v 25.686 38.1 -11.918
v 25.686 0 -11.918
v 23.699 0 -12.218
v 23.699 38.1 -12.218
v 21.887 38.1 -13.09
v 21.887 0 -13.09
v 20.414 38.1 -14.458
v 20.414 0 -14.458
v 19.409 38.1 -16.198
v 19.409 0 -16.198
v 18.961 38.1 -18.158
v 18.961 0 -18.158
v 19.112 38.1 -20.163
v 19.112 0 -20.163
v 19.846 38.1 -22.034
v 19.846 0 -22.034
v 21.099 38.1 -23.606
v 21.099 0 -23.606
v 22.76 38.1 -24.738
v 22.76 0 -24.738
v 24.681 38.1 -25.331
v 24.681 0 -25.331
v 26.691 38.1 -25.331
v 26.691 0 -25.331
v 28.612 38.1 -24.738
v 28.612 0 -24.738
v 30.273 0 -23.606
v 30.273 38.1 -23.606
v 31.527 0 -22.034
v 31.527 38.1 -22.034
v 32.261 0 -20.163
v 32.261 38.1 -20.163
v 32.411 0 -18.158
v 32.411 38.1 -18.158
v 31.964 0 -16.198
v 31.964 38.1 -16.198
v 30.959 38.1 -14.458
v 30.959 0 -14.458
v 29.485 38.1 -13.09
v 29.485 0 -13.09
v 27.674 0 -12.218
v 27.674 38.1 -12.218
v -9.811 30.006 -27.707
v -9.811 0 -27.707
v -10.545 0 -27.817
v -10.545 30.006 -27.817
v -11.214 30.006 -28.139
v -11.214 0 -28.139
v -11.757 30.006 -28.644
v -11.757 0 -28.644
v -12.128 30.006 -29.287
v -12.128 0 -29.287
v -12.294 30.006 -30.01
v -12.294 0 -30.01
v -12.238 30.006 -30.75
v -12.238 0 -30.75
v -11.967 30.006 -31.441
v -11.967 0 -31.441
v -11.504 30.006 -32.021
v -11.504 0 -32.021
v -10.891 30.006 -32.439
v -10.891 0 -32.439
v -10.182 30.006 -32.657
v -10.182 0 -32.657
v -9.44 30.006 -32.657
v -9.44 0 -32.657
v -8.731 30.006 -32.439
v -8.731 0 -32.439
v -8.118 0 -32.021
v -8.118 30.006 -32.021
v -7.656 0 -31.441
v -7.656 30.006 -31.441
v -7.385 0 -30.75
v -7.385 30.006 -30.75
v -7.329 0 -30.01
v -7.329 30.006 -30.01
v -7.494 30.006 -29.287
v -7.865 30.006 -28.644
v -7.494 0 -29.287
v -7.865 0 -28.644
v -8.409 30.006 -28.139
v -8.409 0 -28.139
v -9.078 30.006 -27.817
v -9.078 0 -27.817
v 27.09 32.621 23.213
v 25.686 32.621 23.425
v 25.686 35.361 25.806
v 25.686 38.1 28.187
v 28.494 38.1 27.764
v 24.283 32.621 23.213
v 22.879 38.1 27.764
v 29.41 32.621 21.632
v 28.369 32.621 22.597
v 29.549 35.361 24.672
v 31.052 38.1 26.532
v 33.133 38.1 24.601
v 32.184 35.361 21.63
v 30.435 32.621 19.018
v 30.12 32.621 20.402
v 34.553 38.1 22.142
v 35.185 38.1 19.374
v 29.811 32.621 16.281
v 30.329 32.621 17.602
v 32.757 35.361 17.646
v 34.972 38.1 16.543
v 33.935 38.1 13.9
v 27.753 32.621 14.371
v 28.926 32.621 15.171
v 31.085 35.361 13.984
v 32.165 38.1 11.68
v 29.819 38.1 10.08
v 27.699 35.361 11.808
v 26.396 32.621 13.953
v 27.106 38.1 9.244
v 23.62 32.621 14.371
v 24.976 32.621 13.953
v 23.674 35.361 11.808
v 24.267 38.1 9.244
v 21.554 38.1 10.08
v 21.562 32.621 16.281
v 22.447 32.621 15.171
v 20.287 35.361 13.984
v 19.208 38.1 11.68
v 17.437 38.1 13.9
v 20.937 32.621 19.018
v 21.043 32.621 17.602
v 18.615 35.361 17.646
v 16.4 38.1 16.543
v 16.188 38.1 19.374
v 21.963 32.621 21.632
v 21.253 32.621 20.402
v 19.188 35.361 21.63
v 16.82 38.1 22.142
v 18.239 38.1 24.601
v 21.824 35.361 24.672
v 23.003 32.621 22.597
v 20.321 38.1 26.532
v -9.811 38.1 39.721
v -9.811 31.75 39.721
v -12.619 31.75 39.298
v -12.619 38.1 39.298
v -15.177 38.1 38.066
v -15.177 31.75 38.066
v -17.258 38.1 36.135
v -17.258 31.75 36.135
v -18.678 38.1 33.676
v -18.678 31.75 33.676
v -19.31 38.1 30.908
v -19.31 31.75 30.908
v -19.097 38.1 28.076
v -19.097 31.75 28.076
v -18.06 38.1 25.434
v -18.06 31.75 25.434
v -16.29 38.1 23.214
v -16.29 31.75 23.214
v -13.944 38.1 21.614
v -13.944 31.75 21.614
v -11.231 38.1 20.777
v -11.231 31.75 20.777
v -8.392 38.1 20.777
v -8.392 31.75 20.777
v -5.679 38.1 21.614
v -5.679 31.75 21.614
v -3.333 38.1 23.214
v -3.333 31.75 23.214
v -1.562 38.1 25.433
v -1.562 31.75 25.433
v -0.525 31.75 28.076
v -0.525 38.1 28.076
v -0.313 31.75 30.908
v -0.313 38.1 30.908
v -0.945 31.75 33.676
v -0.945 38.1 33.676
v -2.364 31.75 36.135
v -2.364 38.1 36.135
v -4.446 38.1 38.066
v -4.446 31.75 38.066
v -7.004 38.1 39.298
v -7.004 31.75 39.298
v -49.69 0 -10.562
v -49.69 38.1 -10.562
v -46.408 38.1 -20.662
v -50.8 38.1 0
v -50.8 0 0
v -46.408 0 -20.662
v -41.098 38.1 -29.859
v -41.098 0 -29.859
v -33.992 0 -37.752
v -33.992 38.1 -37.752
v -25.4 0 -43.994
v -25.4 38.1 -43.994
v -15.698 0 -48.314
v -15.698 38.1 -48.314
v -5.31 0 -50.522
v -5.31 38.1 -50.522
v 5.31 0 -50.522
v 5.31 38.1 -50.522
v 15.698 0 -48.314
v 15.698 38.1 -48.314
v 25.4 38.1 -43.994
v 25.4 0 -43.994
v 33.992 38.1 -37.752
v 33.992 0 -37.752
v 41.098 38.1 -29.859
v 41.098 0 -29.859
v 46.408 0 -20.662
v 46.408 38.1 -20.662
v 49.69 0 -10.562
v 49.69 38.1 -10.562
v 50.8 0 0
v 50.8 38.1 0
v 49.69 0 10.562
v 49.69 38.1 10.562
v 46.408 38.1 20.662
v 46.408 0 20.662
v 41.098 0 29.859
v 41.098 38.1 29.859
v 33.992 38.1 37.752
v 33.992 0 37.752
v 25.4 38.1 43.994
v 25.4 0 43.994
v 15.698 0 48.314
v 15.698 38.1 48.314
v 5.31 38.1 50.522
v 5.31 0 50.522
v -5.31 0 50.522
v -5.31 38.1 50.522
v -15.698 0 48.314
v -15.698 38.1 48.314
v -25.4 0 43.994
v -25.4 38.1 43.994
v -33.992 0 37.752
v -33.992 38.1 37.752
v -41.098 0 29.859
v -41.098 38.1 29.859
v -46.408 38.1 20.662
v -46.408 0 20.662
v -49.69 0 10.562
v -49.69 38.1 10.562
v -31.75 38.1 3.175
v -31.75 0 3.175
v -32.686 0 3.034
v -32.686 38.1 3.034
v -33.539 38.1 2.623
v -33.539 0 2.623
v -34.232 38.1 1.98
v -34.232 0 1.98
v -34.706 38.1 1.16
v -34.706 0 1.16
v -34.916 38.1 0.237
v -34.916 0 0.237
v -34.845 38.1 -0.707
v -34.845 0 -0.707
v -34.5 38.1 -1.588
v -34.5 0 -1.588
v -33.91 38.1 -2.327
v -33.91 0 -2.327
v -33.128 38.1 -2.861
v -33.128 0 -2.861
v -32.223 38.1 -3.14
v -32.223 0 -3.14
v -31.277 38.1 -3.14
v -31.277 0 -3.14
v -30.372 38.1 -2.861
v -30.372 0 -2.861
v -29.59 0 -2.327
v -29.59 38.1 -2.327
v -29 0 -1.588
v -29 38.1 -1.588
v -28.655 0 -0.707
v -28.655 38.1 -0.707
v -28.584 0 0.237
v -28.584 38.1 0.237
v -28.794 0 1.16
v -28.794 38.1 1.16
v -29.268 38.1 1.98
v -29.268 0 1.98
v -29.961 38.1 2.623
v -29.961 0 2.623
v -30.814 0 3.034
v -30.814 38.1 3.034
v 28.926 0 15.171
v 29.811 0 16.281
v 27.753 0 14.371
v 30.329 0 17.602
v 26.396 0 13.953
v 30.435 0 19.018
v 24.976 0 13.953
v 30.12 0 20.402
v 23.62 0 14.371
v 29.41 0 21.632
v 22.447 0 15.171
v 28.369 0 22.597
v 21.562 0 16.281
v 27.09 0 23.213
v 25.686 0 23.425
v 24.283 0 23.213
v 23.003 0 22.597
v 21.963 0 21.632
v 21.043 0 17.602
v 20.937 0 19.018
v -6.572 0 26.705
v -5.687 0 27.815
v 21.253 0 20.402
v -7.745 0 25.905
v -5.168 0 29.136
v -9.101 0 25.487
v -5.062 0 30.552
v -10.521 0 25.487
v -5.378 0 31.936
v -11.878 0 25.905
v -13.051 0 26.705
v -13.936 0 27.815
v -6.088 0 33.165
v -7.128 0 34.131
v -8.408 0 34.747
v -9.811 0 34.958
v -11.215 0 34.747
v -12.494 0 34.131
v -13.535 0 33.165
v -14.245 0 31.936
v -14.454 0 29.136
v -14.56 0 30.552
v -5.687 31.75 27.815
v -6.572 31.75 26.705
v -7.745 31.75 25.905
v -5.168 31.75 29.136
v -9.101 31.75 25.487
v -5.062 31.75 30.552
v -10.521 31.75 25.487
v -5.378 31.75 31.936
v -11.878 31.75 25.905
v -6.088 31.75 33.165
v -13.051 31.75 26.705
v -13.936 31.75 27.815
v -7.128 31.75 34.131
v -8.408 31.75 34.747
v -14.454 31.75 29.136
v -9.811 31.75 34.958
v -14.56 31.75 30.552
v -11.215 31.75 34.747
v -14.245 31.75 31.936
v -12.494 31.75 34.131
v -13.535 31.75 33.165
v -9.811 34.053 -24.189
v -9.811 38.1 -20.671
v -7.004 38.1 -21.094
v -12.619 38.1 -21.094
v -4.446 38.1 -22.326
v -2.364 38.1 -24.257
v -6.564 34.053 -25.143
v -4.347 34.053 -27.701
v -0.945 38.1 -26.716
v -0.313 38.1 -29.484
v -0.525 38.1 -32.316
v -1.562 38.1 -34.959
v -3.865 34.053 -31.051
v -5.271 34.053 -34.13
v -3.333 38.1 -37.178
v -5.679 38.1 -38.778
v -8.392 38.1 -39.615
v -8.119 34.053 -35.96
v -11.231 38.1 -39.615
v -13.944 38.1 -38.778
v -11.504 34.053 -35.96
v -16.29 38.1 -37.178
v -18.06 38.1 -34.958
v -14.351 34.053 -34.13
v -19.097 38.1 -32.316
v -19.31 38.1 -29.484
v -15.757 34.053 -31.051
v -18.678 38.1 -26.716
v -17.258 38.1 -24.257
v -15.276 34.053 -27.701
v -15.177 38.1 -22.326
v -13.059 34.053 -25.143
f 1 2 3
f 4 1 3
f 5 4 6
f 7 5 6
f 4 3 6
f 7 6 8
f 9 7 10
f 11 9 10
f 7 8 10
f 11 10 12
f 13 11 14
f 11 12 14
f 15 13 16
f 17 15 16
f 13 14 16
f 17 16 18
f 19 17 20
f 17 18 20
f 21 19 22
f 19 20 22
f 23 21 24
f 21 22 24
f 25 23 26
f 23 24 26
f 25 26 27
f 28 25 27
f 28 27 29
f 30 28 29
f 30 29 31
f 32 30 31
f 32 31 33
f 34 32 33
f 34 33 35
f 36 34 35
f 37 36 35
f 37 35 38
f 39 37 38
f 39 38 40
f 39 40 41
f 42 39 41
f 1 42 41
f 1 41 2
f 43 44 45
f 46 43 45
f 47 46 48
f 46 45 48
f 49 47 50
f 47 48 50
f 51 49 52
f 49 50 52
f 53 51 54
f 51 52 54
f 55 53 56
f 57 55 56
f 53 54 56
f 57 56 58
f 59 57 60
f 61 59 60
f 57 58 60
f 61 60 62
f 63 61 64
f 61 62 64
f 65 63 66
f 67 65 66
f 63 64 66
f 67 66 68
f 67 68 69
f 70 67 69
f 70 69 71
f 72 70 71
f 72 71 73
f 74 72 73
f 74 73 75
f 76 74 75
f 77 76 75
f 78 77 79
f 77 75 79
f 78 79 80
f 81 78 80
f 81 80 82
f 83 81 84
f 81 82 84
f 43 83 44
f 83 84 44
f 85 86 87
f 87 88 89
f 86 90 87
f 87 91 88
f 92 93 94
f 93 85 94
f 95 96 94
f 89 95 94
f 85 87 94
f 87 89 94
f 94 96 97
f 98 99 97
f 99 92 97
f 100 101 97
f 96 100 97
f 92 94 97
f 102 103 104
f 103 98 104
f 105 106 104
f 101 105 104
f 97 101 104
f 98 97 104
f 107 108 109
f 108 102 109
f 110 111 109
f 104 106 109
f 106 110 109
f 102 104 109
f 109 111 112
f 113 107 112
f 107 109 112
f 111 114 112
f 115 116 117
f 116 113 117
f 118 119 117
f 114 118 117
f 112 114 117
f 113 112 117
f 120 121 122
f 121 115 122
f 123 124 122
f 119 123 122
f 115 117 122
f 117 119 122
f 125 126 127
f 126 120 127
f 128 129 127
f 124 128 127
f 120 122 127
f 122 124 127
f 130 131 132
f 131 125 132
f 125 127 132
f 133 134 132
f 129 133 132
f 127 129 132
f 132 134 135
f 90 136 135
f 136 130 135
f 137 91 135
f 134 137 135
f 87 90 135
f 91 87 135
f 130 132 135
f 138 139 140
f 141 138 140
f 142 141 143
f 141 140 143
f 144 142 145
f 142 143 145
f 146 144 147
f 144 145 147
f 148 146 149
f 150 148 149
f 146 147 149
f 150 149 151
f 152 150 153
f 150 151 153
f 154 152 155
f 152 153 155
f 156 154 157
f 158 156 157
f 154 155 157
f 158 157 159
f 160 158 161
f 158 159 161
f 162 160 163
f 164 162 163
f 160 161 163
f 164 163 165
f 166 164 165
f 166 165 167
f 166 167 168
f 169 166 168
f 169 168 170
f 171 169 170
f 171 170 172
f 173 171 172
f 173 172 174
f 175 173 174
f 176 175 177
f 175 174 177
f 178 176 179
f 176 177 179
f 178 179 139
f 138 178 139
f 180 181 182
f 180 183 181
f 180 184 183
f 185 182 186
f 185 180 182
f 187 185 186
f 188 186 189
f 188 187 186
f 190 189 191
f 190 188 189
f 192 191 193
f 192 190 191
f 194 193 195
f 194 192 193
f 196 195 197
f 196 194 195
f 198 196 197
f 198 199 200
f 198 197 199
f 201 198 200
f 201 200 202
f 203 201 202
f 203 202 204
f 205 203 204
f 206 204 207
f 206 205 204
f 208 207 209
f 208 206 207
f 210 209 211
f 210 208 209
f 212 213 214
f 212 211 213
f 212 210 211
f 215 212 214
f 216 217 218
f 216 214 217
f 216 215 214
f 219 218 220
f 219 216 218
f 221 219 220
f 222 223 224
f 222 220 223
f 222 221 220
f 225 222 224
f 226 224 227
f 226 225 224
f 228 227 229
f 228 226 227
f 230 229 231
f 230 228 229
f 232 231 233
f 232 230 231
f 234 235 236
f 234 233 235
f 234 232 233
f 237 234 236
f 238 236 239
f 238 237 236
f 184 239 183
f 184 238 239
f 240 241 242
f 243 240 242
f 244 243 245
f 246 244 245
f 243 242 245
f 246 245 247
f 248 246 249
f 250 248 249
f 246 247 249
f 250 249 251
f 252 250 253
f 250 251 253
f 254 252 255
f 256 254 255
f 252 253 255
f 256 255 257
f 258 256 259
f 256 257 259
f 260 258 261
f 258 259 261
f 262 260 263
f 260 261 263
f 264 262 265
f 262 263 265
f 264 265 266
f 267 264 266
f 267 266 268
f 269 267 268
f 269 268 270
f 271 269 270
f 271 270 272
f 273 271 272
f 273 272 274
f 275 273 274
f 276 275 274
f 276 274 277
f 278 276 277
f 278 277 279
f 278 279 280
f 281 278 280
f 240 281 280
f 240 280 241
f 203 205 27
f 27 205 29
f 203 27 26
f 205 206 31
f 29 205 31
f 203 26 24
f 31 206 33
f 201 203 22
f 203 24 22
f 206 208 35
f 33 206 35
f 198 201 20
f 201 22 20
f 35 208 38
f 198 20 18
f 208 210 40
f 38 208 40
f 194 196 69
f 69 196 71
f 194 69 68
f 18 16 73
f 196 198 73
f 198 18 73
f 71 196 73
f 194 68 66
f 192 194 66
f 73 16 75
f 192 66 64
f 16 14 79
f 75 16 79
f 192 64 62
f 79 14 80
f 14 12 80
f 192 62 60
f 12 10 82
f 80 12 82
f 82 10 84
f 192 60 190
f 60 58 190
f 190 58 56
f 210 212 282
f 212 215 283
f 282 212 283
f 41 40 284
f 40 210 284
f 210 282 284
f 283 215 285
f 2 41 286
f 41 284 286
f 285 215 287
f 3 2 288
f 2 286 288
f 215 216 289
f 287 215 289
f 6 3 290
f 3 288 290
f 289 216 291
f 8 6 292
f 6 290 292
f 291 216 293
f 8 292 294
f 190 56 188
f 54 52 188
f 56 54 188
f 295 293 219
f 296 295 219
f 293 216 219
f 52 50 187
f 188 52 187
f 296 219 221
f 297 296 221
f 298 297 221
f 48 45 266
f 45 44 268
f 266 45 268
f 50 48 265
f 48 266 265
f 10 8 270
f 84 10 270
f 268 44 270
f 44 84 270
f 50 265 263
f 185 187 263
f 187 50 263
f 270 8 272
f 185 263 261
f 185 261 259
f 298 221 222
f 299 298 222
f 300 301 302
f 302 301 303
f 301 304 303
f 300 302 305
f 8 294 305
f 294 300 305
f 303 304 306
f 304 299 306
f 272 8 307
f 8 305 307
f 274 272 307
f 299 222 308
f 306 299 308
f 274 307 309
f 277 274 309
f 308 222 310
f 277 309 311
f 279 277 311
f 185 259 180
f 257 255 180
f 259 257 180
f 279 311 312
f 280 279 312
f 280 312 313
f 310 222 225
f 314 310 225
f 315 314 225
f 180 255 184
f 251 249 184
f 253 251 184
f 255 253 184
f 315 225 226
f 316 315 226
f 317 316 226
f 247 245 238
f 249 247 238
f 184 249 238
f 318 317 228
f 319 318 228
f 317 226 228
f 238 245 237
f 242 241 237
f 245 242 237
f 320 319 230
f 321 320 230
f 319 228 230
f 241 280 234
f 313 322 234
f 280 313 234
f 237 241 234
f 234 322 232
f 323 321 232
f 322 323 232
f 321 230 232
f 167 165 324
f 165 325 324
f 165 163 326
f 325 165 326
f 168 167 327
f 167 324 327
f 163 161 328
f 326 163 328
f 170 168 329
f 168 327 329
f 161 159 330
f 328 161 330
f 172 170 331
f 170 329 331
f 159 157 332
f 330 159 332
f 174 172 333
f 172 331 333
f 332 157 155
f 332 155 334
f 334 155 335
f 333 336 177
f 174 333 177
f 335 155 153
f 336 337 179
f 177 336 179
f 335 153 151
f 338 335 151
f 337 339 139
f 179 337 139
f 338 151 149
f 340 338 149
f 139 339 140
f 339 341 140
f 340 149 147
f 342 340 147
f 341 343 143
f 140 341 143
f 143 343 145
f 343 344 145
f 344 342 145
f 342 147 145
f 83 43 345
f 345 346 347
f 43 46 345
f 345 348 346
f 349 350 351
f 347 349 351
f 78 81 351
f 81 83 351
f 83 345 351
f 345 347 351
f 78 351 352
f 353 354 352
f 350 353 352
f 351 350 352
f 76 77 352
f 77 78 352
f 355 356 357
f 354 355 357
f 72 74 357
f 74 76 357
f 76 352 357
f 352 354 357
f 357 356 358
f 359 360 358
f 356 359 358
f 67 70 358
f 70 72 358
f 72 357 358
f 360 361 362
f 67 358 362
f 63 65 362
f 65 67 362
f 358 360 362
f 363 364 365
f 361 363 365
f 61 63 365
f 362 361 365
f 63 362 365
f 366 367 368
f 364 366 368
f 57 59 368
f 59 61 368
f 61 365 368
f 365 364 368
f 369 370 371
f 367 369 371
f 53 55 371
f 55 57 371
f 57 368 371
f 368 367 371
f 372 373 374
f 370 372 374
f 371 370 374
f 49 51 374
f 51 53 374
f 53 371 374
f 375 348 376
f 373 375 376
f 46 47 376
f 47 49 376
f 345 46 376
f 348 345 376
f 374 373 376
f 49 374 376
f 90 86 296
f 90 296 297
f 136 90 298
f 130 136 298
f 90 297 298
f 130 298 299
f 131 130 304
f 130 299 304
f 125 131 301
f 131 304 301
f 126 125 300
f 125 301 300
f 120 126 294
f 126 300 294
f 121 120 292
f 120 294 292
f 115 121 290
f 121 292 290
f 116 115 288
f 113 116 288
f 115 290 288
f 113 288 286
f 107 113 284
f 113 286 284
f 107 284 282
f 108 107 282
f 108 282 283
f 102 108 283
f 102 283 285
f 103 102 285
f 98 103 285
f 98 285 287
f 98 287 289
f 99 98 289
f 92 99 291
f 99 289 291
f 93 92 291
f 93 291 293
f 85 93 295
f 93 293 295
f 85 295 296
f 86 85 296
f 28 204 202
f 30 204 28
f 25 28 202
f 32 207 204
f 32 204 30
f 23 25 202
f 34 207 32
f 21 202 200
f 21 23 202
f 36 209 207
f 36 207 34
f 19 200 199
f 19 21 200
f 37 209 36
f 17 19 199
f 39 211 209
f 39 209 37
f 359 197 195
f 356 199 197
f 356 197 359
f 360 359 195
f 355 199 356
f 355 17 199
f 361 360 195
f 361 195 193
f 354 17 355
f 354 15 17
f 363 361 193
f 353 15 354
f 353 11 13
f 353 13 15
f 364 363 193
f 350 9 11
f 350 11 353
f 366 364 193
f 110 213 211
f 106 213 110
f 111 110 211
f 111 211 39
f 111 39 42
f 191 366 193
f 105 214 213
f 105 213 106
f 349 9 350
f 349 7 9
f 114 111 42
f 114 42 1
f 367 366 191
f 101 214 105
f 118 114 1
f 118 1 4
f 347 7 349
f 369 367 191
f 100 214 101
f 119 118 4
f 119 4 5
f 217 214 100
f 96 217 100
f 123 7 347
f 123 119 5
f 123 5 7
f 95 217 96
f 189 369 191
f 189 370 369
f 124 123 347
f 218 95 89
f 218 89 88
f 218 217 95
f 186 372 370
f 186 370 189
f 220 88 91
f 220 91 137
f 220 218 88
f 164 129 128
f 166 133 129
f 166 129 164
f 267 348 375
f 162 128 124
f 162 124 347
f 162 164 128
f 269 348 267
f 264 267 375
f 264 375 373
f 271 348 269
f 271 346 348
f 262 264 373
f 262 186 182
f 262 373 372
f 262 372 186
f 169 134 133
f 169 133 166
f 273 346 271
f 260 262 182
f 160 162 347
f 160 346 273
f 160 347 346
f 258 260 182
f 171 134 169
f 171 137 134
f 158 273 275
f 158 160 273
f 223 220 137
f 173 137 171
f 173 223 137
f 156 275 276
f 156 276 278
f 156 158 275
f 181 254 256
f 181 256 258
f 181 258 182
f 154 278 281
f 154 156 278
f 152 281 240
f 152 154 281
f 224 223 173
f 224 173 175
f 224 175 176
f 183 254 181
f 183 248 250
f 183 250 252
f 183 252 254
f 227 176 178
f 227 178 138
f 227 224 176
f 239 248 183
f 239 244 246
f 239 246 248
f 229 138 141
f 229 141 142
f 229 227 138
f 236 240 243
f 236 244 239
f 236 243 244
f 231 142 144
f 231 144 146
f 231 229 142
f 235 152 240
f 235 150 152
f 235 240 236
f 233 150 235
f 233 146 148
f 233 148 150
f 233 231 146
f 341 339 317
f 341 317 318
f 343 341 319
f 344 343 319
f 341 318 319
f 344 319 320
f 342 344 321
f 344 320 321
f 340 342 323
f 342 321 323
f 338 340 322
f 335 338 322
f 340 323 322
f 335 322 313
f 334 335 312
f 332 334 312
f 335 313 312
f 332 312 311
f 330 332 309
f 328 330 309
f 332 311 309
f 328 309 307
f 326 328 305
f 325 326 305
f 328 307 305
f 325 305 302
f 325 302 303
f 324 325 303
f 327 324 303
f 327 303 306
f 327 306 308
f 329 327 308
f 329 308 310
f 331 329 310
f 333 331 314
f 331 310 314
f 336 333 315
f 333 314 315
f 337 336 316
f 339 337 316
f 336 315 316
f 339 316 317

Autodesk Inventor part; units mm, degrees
ref_plane "YZ Plane" through (0, 0, 0) normal (1, 0, 0) x (0, 1, 0)
ref_plane "XZ Plane" through (0, 0, 0) normal (0, 1, 0) x (-1, 0, 0)
ref_plane "XY Plane" through (0, 0, 0) normal (0, 0, 1) x (1, 0, 0)
sketch "Sketch1" plane through (0, 0, 0) normal (0, 1, 0) x (-1, 0, 0)
  circle A0 centre (0, 0) radius 50.8
  dimension "d0" = 101.6
extrude "Extrusion1" add sketch "Sketch1" along normal blind 38.1
sketch "Sketch2" plane through (0, 38.1, 0) normal (0, 1, 0) x (1, 0, 0)
  point P0 (0, 0)
  point P1 (-31.75, 0)
  point P2 (-9.8113, -30.196)
  point P3 (25.6863, -18.6622)
  point P4 (25.6863, 18.6622)
  point P5 (-9.8113, 30.196)
  dimension "d3" = 31.75
  dimension "d4" = 0
  dimension "d7" = 360
hole "Hole1" at (-31.75, 38.1, 0) direction (0, -1, 0) diameter 6.35 end through all
hole "Hole2" at (-9.8113, 38.1, 30.196) direction (0, -1, 0) diameter 9.525 end through all counterbore diameter 19.05 counterbore depth 6.35
hole "Hole3" at (25.6863, 38.1, 18.6622) direction (0, -1, 0) diameter 9.525 end through all countersink diameter 19.05 countersink angle 82
hole "Hole4" at (-9.8113, 38.1, -30.196) direction (0, -1, 0) diameter 4.9784 end through all countersink diameter 19.05 countersink angle 82 thread size "1/4-20 UNC" class "1B" standard "ANSI Unified Screw Threads"
hole "Hole5" at (25.6863, 38.1, -18.6622) direction (0, -1, 0) diameter 13.4874 end through all clearance for "Hex Head Bolt" size "1/2" standard "Ansi Unified Screw Threads"
properties part number "Hole Practice"
